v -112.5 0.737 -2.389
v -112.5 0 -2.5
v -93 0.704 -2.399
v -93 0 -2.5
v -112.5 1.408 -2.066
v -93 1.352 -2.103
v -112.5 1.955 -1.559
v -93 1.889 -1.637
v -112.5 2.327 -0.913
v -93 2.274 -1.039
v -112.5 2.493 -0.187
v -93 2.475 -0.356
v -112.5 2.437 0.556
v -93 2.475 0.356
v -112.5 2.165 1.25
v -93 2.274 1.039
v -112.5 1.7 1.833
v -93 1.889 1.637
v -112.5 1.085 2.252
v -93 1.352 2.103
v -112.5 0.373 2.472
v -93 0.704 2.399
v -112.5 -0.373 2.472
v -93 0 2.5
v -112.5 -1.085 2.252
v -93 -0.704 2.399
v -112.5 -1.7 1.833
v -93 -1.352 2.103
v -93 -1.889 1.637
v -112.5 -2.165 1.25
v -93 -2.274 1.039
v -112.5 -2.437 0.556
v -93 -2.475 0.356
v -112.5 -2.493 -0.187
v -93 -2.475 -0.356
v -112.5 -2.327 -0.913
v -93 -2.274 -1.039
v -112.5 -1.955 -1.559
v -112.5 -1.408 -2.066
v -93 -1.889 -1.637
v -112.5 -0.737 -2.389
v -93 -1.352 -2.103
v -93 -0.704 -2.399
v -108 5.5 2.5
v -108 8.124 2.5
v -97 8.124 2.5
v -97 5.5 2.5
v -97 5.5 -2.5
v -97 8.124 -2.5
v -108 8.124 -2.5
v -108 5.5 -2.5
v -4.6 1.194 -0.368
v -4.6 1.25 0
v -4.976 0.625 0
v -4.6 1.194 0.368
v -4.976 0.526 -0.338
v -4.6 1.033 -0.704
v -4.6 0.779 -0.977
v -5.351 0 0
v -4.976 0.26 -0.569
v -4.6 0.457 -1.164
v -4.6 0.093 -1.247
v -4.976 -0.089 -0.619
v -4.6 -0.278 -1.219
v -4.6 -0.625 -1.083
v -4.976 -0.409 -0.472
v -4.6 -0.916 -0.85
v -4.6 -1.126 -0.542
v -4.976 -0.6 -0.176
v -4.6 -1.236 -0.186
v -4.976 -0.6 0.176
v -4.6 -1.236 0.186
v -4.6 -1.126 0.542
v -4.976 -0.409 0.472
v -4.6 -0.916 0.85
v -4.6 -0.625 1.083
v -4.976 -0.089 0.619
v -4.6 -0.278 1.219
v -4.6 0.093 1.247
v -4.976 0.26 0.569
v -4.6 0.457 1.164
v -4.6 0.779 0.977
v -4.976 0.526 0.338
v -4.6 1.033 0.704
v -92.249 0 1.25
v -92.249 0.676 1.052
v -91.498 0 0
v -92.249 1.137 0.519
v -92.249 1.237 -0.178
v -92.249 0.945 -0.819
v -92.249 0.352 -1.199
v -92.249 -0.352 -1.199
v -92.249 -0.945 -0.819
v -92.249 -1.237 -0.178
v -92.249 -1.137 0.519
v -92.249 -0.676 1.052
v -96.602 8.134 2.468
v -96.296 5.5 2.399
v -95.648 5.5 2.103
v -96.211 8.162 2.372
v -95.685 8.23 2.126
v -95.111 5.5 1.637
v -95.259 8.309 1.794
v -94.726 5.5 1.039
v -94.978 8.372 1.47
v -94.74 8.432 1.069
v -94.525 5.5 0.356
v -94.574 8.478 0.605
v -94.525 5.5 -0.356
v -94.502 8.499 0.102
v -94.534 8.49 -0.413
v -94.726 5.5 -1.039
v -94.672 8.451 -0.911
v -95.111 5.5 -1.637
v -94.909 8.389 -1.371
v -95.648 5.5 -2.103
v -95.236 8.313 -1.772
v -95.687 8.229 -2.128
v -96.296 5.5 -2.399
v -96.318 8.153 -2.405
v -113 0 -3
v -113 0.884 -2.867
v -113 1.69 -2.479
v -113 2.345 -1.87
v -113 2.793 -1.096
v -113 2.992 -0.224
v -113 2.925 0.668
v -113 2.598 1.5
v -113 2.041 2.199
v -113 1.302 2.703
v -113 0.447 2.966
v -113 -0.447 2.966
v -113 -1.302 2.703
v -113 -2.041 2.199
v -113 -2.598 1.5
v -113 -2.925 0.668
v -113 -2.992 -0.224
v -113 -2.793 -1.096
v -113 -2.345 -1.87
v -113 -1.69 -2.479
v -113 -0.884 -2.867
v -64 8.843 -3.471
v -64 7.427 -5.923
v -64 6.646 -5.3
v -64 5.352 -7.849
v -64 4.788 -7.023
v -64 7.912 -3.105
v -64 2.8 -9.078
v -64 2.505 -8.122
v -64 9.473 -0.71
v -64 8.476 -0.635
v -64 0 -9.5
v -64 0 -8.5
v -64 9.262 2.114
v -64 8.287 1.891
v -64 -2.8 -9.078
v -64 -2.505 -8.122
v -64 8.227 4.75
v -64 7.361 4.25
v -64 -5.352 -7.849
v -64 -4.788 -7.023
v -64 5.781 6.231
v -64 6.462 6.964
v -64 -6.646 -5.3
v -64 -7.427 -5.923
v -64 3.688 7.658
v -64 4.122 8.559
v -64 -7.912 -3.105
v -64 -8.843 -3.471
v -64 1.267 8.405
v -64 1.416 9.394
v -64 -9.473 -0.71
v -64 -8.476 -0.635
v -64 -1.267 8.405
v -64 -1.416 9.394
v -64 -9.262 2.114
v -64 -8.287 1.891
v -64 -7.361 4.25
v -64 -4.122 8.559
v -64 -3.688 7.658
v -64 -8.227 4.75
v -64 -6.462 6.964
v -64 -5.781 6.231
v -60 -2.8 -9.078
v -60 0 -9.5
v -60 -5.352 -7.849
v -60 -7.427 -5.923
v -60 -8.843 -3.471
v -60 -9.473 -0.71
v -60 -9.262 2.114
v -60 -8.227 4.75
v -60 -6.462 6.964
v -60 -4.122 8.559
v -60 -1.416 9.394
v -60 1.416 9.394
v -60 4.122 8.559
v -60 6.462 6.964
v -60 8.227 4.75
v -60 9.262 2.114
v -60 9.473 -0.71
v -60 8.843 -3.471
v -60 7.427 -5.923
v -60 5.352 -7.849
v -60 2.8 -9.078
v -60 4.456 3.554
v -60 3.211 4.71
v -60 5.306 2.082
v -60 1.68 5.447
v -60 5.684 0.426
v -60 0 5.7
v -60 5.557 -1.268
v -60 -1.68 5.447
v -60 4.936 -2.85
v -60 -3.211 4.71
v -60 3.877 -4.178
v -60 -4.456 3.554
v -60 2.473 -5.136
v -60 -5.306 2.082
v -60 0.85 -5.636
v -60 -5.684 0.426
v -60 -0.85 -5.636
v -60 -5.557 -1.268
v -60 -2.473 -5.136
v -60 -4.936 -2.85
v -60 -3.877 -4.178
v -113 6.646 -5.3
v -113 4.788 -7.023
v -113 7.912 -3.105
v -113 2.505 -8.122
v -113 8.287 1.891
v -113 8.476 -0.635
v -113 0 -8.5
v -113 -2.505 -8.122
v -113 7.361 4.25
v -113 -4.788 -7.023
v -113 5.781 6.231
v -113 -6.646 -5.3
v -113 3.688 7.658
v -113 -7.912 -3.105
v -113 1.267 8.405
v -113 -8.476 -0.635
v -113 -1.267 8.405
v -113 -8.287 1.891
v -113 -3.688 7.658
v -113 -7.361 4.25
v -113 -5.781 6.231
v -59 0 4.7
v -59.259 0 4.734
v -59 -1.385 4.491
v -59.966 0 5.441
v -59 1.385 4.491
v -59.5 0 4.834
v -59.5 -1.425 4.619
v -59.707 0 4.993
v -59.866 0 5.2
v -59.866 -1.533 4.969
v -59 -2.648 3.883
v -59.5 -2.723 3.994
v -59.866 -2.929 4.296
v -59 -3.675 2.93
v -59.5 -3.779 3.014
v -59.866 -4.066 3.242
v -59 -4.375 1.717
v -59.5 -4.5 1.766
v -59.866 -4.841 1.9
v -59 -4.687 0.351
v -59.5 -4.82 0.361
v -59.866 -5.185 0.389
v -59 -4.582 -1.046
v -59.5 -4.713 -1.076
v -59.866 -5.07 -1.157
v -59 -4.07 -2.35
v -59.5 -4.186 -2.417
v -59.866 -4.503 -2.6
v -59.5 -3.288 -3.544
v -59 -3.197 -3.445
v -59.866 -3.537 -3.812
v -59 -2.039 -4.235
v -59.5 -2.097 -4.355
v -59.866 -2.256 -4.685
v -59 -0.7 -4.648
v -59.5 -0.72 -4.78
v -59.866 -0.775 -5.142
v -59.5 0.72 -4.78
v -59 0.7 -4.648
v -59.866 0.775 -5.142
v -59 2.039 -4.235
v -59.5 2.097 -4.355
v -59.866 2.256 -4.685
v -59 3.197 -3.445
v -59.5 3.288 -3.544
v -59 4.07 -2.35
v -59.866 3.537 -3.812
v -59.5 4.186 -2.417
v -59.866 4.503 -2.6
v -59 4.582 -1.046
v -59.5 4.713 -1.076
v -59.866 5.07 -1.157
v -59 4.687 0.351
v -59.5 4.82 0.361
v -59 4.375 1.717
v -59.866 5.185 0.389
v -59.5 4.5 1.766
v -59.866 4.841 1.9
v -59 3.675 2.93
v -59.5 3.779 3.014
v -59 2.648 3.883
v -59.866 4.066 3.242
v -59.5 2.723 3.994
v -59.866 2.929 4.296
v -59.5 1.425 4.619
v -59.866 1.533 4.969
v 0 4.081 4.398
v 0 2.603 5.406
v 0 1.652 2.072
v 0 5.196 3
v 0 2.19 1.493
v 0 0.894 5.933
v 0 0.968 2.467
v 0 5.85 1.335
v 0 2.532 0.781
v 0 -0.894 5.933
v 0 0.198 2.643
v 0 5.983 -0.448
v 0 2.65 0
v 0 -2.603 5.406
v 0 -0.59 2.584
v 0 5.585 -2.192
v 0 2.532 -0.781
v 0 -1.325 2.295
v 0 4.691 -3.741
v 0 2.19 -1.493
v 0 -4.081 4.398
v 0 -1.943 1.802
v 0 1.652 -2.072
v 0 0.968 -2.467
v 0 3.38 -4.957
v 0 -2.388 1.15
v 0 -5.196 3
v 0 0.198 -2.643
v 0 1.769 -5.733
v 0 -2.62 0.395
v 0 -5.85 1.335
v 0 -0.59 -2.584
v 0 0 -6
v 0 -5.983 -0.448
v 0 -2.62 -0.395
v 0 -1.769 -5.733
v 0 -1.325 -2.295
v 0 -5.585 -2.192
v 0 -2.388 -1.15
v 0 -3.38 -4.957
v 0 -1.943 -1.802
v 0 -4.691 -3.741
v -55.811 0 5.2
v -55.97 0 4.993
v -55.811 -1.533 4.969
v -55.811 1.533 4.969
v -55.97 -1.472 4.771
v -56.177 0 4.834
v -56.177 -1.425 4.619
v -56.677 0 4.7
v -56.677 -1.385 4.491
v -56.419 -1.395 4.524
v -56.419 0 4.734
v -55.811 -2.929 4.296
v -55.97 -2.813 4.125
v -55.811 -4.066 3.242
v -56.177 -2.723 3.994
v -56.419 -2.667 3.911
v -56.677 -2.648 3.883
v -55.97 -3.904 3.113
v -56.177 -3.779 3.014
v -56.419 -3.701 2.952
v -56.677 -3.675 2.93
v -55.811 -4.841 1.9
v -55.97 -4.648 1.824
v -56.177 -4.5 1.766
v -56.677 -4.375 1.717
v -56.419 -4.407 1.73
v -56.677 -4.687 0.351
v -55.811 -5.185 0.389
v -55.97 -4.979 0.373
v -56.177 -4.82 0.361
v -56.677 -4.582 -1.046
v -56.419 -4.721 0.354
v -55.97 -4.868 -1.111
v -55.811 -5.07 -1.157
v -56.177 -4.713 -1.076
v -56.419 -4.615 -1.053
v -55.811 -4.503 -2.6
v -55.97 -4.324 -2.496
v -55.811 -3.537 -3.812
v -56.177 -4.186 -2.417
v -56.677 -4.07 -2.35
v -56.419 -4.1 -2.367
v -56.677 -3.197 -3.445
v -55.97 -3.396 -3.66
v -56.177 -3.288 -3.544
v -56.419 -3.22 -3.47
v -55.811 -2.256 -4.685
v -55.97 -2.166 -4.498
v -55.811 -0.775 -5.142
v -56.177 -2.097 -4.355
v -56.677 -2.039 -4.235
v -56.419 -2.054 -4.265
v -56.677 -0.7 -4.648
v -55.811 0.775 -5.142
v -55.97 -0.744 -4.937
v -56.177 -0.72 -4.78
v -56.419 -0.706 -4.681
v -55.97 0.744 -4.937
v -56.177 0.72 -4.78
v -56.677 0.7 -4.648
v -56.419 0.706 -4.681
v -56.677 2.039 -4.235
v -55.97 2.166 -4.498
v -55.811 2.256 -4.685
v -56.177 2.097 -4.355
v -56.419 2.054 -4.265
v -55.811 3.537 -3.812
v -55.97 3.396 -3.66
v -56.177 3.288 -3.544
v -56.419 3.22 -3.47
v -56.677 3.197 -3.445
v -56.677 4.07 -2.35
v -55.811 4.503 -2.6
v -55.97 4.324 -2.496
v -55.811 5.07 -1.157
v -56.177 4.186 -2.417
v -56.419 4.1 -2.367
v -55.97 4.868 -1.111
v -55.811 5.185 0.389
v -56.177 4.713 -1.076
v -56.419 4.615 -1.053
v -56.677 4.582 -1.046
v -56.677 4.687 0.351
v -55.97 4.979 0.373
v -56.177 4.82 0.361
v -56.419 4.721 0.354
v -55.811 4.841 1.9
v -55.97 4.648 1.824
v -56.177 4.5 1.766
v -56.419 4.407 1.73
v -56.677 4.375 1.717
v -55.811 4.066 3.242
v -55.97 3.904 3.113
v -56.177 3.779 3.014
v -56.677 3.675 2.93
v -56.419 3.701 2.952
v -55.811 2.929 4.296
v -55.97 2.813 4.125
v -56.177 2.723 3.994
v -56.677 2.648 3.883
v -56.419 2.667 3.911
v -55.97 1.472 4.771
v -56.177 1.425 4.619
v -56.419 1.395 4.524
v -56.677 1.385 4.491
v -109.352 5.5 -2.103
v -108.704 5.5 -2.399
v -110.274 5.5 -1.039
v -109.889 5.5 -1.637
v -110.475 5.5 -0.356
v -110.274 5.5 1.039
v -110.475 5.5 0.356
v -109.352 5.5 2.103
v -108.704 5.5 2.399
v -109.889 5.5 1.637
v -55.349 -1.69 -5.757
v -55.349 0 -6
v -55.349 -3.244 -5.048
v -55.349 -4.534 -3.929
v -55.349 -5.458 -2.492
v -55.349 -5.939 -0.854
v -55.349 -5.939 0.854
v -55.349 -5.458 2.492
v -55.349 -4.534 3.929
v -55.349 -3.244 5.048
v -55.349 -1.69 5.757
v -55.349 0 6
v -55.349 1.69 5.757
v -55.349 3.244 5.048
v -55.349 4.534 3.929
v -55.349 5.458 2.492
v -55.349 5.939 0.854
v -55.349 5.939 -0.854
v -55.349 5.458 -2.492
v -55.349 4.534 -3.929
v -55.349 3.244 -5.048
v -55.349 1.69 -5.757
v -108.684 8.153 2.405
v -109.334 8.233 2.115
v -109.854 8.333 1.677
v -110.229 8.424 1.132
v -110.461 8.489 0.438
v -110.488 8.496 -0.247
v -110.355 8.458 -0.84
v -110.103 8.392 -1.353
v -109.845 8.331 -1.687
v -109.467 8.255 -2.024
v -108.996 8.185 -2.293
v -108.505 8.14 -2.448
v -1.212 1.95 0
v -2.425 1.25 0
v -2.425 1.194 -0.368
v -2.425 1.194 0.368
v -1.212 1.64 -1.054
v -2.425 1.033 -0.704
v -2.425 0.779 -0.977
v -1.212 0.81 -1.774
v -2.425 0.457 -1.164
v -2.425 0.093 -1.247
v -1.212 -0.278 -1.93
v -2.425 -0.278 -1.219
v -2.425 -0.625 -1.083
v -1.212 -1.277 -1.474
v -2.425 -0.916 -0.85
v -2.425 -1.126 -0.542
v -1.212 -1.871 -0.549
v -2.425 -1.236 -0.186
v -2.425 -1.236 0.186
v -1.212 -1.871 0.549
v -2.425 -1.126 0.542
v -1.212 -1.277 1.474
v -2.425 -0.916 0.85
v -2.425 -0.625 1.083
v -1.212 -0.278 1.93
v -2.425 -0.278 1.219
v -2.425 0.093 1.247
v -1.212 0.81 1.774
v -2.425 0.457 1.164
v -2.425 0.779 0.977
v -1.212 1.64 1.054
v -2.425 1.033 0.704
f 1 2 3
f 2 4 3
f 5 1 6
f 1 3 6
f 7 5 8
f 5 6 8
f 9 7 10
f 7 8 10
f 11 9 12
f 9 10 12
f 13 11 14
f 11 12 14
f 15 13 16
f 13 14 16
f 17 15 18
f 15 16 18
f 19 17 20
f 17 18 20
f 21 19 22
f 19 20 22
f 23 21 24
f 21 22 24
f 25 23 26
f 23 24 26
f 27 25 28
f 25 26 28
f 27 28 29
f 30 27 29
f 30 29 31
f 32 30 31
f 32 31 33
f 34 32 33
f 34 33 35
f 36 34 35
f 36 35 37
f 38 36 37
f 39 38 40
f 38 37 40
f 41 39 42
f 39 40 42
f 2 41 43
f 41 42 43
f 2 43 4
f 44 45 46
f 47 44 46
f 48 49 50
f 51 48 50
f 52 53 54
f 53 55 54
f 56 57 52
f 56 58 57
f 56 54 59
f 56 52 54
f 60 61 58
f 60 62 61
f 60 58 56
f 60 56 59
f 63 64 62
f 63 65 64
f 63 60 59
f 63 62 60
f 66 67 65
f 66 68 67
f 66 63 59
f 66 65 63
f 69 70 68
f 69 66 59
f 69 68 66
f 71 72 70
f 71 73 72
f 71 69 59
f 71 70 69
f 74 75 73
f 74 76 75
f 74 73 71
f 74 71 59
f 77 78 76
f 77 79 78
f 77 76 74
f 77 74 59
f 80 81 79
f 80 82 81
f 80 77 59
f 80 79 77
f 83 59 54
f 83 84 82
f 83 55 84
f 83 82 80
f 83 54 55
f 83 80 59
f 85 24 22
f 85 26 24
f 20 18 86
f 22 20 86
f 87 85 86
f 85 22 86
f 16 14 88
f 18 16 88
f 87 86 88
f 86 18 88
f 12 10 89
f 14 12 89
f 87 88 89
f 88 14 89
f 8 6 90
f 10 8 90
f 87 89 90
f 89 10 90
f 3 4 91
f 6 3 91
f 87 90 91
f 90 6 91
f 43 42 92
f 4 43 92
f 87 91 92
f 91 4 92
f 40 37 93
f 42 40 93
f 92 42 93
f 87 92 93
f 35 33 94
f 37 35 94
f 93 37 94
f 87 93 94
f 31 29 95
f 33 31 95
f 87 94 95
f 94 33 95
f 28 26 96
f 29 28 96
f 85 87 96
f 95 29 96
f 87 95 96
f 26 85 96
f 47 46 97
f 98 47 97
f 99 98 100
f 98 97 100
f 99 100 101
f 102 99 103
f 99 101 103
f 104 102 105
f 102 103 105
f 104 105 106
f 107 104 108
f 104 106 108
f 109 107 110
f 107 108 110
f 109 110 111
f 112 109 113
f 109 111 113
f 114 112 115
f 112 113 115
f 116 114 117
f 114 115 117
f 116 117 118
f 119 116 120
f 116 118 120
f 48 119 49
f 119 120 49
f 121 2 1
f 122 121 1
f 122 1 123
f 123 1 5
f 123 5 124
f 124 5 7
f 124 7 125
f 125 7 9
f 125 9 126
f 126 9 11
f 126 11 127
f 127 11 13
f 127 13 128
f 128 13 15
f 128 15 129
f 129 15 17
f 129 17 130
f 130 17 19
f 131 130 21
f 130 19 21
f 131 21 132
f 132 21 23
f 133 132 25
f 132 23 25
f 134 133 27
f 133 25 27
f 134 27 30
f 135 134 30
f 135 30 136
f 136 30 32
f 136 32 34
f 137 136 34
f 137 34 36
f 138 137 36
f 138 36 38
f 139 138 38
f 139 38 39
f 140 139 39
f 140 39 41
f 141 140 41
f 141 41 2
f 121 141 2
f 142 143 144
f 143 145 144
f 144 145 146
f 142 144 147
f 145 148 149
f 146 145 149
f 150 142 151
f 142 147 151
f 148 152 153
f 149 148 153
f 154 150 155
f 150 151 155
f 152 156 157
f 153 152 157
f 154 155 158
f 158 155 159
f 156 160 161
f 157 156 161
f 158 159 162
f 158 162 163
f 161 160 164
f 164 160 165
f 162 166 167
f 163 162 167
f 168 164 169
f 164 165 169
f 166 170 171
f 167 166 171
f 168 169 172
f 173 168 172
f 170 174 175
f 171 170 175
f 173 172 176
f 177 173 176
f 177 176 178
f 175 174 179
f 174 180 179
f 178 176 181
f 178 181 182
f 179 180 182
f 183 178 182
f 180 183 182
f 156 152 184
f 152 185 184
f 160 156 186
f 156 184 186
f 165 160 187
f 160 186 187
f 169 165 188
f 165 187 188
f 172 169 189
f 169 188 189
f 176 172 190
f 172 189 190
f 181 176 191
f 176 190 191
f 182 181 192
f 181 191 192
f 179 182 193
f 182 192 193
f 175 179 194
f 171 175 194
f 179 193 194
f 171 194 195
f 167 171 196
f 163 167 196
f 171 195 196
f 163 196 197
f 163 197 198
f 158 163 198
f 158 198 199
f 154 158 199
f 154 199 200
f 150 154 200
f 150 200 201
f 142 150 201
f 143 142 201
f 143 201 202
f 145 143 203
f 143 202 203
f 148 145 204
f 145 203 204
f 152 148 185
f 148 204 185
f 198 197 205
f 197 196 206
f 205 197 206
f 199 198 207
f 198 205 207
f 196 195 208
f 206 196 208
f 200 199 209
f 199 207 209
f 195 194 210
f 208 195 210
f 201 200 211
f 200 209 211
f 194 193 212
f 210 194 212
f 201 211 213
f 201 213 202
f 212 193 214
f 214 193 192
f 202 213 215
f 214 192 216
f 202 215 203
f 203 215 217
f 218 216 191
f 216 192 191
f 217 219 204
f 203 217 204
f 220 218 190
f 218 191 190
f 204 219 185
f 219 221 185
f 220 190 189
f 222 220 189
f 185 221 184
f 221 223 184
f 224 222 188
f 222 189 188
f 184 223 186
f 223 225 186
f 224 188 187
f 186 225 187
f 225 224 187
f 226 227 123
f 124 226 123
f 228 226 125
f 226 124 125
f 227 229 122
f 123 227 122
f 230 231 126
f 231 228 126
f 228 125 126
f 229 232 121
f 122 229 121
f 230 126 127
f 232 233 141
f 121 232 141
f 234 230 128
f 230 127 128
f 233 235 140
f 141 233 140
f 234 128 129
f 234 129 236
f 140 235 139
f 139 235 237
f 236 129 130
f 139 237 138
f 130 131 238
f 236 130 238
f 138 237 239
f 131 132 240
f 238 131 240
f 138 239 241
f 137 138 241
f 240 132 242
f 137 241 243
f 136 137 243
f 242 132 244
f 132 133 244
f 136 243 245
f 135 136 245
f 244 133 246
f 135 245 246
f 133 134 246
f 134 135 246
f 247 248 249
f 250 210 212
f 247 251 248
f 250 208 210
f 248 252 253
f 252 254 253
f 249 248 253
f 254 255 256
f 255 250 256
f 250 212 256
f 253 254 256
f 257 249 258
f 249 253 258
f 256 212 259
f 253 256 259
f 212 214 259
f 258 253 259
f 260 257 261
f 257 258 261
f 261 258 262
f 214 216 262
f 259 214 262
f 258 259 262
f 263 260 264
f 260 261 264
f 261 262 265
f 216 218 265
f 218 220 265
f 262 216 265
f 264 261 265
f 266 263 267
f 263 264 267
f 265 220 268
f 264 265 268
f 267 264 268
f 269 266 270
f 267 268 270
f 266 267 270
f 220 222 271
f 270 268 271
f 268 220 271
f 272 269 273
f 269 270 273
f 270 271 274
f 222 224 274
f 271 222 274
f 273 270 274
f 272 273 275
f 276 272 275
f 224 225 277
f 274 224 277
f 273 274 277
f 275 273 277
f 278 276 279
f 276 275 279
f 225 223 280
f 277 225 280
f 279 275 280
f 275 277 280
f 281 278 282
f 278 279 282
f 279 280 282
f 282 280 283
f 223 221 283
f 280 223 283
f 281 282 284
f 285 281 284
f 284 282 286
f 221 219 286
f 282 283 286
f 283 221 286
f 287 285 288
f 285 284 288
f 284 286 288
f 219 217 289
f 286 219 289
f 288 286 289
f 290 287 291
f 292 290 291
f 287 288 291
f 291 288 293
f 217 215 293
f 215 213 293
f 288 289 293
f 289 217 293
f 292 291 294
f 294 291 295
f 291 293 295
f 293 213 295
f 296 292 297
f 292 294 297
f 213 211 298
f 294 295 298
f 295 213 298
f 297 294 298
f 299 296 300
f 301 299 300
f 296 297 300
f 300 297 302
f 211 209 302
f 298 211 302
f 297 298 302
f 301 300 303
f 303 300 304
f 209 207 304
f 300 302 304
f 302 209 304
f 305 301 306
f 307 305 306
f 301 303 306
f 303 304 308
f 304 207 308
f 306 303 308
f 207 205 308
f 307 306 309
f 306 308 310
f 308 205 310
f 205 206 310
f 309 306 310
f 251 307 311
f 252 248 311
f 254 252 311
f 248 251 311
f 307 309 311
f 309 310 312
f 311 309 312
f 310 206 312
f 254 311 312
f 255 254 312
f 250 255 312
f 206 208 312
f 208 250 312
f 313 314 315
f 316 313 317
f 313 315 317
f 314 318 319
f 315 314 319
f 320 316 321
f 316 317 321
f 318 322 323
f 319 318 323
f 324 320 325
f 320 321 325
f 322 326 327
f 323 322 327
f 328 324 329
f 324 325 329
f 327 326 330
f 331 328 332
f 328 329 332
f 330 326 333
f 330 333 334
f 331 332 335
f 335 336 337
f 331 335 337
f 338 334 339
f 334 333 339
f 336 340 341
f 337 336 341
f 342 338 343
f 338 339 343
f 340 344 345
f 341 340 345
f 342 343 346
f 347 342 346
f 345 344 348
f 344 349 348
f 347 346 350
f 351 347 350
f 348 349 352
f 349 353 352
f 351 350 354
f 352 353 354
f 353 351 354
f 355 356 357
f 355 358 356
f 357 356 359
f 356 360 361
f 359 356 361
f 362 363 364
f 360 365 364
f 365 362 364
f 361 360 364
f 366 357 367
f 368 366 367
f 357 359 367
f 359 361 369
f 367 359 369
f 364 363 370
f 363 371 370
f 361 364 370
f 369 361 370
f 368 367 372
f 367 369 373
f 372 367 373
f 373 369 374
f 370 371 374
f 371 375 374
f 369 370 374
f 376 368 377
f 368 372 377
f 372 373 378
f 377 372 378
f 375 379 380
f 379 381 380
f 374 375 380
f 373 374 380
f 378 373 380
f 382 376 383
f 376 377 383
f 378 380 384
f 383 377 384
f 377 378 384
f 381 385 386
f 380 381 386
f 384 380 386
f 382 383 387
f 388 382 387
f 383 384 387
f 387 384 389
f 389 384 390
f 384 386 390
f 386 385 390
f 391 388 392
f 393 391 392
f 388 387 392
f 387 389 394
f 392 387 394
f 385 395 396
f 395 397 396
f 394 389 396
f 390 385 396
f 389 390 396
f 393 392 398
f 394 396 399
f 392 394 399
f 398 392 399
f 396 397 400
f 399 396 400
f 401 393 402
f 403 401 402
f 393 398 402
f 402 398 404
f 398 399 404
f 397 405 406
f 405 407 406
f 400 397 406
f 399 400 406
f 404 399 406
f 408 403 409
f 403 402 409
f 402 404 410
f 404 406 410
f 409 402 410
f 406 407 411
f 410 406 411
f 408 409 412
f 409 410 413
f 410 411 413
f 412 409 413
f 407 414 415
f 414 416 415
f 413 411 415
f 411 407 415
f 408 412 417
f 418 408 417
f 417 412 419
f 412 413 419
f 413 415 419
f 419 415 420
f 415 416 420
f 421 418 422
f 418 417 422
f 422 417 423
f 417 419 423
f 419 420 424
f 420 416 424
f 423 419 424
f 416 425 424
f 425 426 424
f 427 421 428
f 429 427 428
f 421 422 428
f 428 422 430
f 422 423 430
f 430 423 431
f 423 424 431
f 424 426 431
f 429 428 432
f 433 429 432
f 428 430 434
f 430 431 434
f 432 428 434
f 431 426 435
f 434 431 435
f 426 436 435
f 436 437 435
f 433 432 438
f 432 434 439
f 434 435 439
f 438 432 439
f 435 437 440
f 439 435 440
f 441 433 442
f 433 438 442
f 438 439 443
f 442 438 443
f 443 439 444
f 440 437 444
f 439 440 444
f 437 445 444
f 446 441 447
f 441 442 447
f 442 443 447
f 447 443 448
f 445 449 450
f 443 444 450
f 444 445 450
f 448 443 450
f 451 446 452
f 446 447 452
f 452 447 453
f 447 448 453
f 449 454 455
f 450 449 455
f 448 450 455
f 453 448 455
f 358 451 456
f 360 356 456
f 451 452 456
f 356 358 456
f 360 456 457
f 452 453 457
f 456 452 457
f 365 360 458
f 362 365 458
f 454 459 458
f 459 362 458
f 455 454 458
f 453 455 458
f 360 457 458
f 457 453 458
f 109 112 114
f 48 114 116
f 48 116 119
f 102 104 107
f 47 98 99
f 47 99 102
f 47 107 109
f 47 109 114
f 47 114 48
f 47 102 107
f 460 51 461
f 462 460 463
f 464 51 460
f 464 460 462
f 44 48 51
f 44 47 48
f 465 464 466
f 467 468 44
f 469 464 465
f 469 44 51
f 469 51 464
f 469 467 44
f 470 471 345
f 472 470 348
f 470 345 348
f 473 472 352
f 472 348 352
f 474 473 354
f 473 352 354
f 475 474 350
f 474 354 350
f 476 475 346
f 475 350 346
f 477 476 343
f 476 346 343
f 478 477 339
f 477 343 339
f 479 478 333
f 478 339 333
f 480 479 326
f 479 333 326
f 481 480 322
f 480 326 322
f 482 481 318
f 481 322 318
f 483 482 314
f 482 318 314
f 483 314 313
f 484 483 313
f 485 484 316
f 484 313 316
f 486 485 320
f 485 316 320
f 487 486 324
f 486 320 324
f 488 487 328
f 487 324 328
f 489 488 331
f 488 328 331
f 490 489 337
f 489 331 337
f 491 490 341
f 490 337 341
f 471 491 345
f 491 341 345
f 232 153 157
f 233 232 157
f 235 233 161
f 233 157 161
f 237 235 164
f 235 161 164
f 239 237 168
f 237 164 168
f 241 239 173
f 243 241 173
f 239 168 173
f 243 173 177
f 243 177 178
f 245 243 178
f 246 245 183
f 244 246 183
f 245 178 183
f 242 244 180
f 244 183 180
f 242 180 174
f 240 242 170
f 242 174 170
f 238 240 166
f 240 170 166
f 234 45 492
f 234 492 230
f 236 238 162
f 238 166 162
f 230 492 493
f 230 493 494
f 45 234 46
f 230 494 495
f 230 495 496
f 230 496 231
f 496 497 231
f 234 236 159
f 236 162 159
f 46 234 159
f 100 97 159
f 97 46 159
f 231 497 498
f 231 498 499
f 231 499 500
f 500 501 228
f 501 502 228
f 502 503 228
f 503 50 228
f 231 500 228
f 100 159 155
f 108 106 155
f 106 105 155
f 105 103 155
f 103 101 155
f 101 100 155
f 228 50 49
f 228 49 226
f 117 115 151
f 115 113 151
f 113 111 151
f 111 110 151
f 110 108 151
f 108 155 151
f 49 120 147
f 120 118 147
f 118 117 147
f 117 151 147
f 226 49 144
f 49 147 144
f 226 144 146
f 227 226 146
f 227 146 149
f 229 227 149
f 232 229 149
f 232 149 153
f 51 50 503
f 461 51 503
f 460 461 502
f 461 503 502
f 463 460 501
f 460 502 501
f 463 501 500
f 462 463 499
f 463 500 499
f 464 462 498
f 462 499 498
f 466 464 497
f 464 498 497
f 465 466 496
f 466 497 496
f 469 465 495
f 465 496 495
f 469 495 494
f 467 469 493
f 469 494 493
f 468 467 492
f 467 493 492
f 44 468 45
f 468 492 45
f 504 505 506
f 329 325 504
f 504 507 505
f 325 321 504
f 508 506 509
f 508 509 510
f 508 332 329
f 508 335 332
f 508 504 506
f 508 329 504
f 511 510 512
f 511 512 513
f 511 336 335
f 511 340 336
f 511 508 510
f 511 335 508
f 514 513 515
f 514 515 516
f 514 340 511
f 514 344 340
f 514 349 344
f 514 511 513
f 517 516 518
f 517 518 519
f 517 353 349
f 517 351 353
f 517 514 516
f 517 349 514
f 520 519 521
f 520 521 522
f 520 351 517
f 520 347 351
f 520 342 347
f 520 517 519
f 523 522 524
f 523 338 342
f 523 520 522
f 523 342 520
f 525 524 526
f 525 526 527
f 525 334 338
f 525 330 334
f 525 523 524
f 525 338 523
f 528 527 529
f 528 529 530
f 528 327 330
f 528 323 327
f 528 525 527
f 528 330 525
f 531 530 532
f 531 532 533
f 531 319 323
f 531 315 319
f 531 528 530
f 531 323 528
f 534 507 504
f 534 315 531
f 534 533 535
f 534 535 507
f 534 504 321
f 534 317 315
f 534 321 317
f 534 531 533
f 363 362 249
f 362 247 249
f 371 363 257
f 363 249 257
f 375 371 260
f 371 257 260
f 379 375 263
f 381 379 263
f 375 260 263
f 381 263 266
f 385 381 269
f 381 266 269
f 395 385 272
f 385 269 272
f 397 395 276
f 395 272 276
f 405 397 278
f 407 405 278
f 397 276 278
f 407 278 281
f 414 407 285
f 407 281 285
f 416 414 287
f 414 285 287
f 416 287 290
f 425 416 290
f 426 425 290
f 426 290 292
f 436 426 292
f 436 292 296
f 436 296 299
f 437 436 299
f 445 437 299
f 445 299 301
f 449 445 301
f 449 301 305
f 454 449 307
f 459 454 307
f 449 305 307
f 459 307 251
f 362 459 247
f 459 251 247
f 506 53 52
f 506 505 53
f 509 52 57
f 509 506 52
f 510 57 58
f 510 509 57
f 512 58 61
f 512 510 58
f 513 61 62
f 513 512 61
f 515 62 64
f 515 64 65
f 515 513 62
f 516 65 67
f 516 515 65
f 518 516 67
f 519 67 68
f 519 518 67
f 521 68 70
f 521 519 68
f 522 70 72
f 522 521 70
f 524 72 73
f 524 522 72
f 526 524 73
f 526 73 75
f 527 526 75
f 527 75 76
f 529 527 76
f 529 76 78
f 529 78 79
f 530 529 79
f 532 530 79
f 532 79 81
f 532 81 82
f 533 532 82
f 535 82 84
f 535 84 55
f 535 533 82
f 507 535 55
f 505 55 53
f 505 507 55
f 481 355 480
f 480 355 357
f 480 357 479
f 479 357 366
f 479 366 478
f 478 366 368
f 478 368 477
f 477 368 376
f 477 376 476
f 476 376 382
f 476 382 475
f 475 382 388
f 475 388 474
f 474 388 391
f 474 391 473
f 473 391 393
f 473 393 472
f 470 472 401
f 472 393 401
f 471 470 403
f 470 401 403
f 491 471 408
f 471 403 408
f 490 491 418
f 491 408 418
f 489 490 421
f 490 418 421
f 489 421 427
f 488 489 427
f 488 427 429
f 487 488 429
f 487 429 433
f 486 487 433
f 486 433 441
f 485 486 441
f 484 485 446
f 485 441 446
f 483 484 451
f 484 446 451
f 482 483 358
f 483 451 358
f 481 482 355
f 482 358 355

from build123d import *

# Parameters (mm, degrees)
SCHNITT_LINEAR_AUSTRAGEN1_DEPTH = 3
M6_GEWINDEBOHRUNG1_D            = 5
M6_GEWINDEBOHRUNG1_DEPTH        = 20
M6_GEWINDEBOHRUNG1_CSINK_D      = 6
M6_GEWINDEBOHRUNG1_CSINK_ANGLE  = 90
M6_GEWINDEBOHRUNG1_TIP          = 1.502151548


with BuildPart() as part:
    # Skizze1 → Rotation1 (revolve)
    with BuildSketch(Plane.XY, mode=Mode.PRIVATE) as rotation1_sk:
        Polygon((-113, 0), (-113, 8.5), (-64, 8.5), (-64, 9.5), (-60, 9.5), (-60, 6), (0, 6), (0, 0), align=None)
    revolve(rotation1_sk.sketch.rotate(Axis((13.513507739, 0, 0), (-1, 0, 0)), 90), axis=Axis((13.513507739, 0, 0), (-1, 0, 0)))

    # Skizze2 → Schnitt-Linear austragen1 (cut)
    with BuildSketch(Plane(origin=(0, 8.5, 0), x_dir=(-1, 0, 0), z_dir=(0, 1, 0))):
        with BuildLine():
            Line((108, 2.5), (97, 2.5))
            ThreePointArc((97, 2.5), (94.5, 0), (97, -2.5))
            Line((97, -2.5), (108, -2.5))
            ThreePointArc((108, -2.5), (110.5, 0), (108, 2.5))
        make_face()
    extrude(amount=-SCHNITT_LINEAR_AUSTRAGEN1_DEPTH, mode=Mode.SUBTRACT)

    # M6 Gewindebohrung1
    with Locations(Plane.ZY.offset(113)):
        with Locations((0, 0)):
            CounterSinkHole(M6_GEWINDEBOHRUNG1_D / 2, M6_GEWINDEBOHRUNG1_CSINK_D / 2, depth=M6_GEWINDEBOHRUNG1_DEPTH, counter_sink_angle=M6_GEWINDEBOHRUNG1_CSINK_ANGLE)
            with Locations((0, 0, -(M6_GEWINDEBOHRUNG1_DEPTH + M6_GEWINDEBOHRUNG1_TIP / 2))):  # 118° drill point
                Cone(0, M6_GEWINDEBOHRUNG1_D / 2, M6_GEWINDEBOHRUNG1_TIP, mode=Mode.SUBTRACT)

    # Skizze31 → Schnitt-Rotation1 (revolve, cut)
    with BuildSketch(Plane(origin=(-60, 0, 0), x_dir=(-1, 0, 0), z_dir=(0, 0, -1)), mode=Mode.PRIVATE) as schnitt_rotation1_sk:
        with BuildLine():
            Line((-4.65055535, 6), (-4.188675135, 5.2))
            ThreePointArc((-4.188675135, 5.2), (-3.822649731, 4.833974596), (-3.322649731, 4.7))
            Line((-3.322649731, 4.7), (-1, 4.7))
            ThreePointArc((-1, 4.7), (-0.292893219, 4.992893219), (0, 5.7))
            Line((0, 5.7), (0, 6))
            Line((0, 6), (-4.65055535, 6))
        make_face()
    revolve(schnitt_rotation1_sk.sketch.rotate(Axis((-73.677186203, 0, 0), (1, 0, 0)), 90), axis=Axis((-73.677186203, 0, 0), (1, 0, 0)), mode=Mode.SUBTRACT)

    # Skizze32 → Schnitt-Rotation11 (revolve, cut)
    with BuildSketch(Plane(origin=(0, 0, 0), x_dir=(0, 0, -1), z_dir=(0, -1, 0)), mode=Mode.PRIVATE) as schnitt_rotation11_sk:
        Polygon((0, -5.351075774), (1.25, -4.6), (1.25, -2.424871131), (2.65, 0), (0, 0), align=None)
    revolve(schnitt_rotation11_sk.sketch.rotate(Axis((0, 0, 0), (-1, 0, 0)), 270), axis=Axis((0, 0, 0), (-1, 0, 0)), mode=Mode.SUBTRACT)


solid = part.part
